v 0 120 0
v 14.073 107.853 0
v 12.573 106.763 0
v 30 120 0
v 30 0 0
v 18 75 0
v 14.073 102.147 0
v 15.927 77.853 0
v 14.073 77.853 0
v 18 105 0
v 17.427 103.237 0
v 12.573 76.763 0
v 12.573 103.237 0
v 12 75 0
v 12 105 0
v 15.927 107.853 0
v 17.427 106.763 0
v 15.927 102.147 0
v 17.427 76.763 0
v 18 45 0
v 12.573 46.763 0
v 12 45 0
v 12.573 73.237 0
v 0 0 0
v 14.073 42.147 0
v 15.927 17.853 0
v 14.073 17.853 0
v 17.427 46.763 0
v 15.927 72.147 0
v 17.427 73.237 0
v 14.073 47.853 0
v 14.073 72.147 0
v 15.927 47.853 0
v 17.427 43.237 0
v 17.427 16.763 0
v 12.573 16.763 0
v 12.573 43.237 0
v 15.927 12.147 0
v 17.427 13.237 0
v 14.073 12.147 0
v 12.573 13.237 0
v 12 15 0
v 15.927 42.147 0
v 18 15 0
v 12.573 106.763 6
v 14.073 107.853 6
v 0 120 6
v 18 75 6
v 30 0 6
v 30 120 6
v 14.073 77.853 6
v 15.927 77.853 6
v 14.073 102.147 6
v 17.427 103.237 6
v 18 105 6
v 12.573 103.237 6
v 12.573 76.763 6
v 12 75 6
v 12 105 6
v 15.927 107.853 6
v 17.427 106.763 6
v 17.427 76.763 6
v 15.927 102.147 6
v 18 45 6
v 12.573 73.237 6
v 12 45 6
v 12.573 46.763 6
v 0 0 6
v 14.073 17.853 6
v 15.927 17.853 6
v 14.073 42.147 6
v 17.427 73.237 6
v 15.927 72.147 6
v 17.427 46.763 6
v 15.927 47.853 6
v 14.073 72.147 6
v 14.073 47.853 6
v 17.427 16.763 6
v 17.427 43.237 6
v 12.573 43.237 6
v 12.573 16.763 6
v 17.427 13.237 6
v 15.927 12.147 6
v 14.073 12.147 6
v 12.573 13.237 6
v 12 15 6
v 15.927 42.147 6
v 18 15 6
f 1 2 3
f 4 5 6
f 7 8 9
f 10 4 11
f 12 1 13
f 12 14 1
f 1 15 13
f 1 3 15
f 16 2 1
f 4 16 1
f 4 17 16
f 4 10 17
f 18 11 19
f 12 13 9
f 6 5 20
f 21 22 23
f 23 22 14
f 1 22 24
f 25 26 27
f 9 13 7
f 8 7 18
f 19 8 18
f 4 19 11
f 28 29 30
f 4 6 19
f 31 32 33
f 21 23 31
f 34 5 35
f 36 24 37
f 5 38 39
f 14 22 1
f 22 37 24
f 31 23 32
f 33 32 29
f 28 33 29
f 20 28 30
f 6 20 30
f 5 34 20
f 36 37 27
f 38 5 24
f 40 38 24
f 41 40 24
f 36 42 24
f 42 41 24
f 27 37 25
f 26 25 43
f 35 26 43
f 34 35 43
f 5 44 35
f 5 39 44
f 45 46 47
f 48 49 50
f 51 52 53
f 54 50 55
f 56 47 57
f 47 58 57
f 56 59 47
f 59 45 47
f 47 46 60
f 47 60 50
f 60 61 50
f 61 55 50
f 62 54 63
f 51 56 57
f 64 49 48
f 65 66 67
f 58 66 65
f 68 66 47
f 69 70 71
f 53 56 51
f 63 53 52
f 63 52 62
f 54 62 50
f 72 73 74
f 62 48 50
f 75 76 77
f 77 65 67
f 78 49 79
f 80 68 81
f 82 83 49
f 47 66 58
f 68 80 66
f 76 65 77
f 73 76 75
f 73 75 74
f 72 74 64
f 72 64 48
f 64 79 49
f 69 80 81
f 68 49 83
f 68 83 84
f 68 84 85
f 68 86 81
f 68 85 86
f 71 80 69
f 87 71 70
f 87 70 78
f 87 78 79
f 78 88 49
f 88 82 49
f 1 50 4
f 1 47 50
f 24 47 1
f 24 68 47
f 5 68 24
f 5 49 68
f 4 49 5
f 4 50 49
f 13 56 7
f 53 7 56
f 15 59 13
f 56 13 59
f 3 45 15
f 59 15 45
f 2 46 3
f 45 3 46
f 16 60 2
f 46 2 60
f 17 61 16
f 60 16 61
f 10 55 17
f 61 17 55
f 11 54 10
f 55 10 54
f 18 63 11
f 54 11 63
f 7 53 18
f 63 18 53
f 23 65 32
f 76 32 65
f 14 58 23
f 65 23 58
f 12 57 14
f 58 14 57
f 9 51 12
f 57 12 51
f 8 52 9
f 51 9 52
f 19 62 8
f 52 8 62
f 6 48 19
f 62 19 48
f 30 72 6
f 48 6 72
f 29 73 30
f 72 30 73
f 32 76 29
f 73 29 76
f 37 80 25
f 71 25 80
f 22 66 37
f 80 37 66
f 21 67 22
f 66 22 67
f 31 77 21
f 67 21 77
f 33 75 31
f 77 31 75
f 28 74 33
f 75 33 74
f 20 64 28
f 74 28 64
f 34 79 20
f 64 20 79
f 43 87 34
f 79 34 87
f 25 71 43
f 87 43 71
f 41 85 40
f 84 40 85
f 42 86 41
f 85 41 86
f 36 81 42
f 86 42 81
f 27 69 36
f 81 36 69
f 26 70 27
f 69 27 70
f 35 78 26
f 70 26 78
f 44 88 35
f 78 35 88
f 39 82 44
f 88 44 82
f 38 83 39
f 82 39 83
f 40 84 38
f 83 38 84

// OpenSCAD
// file: ../../lib/profile_connector.scad
module profile_connector(profile_width=30, num_holes=4, hole_diam=6, thickness=6) {
    width = profile_width;
    length = num_holes * profile_width;

    color([0, 0.5, 0.8, 0.5]) {
        linear_extrude(thickness) {
            difference() {
                square([width, length]);
                union() {
                    for (i = [0 : num_holes-1]) {
                        translate([width/2, width/2 + i * width]) circle(d=hole_diam);
                    }
                }
            }
        }
    }
}

module profile_connector_double(profile_width=30, num_holes=4, hole_diam=6, thickness=6) {
    width = profile_width * 2;
    length = num_holes * profile_width;

    color([0, 0.5, 0.8, 0.5]) {
        linear_extrude(thickness) {
            difference() {
                square([width, length]);
                union() {
                    for (i = [0 : num_holes-1]) {
                        translate([width/4, width/4 + i * width/2]) circle(d=hole_diam);
                        translate([3*width/4, width/4 + i * width/2]) circle(d=hole_diam);
                    }
                }
            }
        }
    }
}

module profile_connector_E30x120() {
    profile_connector(profile_width=30, num_holes=4, hole_diam=6, thickness=6);
}

module profile_connector_E60x120() {
    profile_connector_double(profile_width=30, num_holes=4, hole_diam=6, thickness=6);
}
// main file
include <../../lib/profile_connector.scad>

profile_connector_E30x120();
